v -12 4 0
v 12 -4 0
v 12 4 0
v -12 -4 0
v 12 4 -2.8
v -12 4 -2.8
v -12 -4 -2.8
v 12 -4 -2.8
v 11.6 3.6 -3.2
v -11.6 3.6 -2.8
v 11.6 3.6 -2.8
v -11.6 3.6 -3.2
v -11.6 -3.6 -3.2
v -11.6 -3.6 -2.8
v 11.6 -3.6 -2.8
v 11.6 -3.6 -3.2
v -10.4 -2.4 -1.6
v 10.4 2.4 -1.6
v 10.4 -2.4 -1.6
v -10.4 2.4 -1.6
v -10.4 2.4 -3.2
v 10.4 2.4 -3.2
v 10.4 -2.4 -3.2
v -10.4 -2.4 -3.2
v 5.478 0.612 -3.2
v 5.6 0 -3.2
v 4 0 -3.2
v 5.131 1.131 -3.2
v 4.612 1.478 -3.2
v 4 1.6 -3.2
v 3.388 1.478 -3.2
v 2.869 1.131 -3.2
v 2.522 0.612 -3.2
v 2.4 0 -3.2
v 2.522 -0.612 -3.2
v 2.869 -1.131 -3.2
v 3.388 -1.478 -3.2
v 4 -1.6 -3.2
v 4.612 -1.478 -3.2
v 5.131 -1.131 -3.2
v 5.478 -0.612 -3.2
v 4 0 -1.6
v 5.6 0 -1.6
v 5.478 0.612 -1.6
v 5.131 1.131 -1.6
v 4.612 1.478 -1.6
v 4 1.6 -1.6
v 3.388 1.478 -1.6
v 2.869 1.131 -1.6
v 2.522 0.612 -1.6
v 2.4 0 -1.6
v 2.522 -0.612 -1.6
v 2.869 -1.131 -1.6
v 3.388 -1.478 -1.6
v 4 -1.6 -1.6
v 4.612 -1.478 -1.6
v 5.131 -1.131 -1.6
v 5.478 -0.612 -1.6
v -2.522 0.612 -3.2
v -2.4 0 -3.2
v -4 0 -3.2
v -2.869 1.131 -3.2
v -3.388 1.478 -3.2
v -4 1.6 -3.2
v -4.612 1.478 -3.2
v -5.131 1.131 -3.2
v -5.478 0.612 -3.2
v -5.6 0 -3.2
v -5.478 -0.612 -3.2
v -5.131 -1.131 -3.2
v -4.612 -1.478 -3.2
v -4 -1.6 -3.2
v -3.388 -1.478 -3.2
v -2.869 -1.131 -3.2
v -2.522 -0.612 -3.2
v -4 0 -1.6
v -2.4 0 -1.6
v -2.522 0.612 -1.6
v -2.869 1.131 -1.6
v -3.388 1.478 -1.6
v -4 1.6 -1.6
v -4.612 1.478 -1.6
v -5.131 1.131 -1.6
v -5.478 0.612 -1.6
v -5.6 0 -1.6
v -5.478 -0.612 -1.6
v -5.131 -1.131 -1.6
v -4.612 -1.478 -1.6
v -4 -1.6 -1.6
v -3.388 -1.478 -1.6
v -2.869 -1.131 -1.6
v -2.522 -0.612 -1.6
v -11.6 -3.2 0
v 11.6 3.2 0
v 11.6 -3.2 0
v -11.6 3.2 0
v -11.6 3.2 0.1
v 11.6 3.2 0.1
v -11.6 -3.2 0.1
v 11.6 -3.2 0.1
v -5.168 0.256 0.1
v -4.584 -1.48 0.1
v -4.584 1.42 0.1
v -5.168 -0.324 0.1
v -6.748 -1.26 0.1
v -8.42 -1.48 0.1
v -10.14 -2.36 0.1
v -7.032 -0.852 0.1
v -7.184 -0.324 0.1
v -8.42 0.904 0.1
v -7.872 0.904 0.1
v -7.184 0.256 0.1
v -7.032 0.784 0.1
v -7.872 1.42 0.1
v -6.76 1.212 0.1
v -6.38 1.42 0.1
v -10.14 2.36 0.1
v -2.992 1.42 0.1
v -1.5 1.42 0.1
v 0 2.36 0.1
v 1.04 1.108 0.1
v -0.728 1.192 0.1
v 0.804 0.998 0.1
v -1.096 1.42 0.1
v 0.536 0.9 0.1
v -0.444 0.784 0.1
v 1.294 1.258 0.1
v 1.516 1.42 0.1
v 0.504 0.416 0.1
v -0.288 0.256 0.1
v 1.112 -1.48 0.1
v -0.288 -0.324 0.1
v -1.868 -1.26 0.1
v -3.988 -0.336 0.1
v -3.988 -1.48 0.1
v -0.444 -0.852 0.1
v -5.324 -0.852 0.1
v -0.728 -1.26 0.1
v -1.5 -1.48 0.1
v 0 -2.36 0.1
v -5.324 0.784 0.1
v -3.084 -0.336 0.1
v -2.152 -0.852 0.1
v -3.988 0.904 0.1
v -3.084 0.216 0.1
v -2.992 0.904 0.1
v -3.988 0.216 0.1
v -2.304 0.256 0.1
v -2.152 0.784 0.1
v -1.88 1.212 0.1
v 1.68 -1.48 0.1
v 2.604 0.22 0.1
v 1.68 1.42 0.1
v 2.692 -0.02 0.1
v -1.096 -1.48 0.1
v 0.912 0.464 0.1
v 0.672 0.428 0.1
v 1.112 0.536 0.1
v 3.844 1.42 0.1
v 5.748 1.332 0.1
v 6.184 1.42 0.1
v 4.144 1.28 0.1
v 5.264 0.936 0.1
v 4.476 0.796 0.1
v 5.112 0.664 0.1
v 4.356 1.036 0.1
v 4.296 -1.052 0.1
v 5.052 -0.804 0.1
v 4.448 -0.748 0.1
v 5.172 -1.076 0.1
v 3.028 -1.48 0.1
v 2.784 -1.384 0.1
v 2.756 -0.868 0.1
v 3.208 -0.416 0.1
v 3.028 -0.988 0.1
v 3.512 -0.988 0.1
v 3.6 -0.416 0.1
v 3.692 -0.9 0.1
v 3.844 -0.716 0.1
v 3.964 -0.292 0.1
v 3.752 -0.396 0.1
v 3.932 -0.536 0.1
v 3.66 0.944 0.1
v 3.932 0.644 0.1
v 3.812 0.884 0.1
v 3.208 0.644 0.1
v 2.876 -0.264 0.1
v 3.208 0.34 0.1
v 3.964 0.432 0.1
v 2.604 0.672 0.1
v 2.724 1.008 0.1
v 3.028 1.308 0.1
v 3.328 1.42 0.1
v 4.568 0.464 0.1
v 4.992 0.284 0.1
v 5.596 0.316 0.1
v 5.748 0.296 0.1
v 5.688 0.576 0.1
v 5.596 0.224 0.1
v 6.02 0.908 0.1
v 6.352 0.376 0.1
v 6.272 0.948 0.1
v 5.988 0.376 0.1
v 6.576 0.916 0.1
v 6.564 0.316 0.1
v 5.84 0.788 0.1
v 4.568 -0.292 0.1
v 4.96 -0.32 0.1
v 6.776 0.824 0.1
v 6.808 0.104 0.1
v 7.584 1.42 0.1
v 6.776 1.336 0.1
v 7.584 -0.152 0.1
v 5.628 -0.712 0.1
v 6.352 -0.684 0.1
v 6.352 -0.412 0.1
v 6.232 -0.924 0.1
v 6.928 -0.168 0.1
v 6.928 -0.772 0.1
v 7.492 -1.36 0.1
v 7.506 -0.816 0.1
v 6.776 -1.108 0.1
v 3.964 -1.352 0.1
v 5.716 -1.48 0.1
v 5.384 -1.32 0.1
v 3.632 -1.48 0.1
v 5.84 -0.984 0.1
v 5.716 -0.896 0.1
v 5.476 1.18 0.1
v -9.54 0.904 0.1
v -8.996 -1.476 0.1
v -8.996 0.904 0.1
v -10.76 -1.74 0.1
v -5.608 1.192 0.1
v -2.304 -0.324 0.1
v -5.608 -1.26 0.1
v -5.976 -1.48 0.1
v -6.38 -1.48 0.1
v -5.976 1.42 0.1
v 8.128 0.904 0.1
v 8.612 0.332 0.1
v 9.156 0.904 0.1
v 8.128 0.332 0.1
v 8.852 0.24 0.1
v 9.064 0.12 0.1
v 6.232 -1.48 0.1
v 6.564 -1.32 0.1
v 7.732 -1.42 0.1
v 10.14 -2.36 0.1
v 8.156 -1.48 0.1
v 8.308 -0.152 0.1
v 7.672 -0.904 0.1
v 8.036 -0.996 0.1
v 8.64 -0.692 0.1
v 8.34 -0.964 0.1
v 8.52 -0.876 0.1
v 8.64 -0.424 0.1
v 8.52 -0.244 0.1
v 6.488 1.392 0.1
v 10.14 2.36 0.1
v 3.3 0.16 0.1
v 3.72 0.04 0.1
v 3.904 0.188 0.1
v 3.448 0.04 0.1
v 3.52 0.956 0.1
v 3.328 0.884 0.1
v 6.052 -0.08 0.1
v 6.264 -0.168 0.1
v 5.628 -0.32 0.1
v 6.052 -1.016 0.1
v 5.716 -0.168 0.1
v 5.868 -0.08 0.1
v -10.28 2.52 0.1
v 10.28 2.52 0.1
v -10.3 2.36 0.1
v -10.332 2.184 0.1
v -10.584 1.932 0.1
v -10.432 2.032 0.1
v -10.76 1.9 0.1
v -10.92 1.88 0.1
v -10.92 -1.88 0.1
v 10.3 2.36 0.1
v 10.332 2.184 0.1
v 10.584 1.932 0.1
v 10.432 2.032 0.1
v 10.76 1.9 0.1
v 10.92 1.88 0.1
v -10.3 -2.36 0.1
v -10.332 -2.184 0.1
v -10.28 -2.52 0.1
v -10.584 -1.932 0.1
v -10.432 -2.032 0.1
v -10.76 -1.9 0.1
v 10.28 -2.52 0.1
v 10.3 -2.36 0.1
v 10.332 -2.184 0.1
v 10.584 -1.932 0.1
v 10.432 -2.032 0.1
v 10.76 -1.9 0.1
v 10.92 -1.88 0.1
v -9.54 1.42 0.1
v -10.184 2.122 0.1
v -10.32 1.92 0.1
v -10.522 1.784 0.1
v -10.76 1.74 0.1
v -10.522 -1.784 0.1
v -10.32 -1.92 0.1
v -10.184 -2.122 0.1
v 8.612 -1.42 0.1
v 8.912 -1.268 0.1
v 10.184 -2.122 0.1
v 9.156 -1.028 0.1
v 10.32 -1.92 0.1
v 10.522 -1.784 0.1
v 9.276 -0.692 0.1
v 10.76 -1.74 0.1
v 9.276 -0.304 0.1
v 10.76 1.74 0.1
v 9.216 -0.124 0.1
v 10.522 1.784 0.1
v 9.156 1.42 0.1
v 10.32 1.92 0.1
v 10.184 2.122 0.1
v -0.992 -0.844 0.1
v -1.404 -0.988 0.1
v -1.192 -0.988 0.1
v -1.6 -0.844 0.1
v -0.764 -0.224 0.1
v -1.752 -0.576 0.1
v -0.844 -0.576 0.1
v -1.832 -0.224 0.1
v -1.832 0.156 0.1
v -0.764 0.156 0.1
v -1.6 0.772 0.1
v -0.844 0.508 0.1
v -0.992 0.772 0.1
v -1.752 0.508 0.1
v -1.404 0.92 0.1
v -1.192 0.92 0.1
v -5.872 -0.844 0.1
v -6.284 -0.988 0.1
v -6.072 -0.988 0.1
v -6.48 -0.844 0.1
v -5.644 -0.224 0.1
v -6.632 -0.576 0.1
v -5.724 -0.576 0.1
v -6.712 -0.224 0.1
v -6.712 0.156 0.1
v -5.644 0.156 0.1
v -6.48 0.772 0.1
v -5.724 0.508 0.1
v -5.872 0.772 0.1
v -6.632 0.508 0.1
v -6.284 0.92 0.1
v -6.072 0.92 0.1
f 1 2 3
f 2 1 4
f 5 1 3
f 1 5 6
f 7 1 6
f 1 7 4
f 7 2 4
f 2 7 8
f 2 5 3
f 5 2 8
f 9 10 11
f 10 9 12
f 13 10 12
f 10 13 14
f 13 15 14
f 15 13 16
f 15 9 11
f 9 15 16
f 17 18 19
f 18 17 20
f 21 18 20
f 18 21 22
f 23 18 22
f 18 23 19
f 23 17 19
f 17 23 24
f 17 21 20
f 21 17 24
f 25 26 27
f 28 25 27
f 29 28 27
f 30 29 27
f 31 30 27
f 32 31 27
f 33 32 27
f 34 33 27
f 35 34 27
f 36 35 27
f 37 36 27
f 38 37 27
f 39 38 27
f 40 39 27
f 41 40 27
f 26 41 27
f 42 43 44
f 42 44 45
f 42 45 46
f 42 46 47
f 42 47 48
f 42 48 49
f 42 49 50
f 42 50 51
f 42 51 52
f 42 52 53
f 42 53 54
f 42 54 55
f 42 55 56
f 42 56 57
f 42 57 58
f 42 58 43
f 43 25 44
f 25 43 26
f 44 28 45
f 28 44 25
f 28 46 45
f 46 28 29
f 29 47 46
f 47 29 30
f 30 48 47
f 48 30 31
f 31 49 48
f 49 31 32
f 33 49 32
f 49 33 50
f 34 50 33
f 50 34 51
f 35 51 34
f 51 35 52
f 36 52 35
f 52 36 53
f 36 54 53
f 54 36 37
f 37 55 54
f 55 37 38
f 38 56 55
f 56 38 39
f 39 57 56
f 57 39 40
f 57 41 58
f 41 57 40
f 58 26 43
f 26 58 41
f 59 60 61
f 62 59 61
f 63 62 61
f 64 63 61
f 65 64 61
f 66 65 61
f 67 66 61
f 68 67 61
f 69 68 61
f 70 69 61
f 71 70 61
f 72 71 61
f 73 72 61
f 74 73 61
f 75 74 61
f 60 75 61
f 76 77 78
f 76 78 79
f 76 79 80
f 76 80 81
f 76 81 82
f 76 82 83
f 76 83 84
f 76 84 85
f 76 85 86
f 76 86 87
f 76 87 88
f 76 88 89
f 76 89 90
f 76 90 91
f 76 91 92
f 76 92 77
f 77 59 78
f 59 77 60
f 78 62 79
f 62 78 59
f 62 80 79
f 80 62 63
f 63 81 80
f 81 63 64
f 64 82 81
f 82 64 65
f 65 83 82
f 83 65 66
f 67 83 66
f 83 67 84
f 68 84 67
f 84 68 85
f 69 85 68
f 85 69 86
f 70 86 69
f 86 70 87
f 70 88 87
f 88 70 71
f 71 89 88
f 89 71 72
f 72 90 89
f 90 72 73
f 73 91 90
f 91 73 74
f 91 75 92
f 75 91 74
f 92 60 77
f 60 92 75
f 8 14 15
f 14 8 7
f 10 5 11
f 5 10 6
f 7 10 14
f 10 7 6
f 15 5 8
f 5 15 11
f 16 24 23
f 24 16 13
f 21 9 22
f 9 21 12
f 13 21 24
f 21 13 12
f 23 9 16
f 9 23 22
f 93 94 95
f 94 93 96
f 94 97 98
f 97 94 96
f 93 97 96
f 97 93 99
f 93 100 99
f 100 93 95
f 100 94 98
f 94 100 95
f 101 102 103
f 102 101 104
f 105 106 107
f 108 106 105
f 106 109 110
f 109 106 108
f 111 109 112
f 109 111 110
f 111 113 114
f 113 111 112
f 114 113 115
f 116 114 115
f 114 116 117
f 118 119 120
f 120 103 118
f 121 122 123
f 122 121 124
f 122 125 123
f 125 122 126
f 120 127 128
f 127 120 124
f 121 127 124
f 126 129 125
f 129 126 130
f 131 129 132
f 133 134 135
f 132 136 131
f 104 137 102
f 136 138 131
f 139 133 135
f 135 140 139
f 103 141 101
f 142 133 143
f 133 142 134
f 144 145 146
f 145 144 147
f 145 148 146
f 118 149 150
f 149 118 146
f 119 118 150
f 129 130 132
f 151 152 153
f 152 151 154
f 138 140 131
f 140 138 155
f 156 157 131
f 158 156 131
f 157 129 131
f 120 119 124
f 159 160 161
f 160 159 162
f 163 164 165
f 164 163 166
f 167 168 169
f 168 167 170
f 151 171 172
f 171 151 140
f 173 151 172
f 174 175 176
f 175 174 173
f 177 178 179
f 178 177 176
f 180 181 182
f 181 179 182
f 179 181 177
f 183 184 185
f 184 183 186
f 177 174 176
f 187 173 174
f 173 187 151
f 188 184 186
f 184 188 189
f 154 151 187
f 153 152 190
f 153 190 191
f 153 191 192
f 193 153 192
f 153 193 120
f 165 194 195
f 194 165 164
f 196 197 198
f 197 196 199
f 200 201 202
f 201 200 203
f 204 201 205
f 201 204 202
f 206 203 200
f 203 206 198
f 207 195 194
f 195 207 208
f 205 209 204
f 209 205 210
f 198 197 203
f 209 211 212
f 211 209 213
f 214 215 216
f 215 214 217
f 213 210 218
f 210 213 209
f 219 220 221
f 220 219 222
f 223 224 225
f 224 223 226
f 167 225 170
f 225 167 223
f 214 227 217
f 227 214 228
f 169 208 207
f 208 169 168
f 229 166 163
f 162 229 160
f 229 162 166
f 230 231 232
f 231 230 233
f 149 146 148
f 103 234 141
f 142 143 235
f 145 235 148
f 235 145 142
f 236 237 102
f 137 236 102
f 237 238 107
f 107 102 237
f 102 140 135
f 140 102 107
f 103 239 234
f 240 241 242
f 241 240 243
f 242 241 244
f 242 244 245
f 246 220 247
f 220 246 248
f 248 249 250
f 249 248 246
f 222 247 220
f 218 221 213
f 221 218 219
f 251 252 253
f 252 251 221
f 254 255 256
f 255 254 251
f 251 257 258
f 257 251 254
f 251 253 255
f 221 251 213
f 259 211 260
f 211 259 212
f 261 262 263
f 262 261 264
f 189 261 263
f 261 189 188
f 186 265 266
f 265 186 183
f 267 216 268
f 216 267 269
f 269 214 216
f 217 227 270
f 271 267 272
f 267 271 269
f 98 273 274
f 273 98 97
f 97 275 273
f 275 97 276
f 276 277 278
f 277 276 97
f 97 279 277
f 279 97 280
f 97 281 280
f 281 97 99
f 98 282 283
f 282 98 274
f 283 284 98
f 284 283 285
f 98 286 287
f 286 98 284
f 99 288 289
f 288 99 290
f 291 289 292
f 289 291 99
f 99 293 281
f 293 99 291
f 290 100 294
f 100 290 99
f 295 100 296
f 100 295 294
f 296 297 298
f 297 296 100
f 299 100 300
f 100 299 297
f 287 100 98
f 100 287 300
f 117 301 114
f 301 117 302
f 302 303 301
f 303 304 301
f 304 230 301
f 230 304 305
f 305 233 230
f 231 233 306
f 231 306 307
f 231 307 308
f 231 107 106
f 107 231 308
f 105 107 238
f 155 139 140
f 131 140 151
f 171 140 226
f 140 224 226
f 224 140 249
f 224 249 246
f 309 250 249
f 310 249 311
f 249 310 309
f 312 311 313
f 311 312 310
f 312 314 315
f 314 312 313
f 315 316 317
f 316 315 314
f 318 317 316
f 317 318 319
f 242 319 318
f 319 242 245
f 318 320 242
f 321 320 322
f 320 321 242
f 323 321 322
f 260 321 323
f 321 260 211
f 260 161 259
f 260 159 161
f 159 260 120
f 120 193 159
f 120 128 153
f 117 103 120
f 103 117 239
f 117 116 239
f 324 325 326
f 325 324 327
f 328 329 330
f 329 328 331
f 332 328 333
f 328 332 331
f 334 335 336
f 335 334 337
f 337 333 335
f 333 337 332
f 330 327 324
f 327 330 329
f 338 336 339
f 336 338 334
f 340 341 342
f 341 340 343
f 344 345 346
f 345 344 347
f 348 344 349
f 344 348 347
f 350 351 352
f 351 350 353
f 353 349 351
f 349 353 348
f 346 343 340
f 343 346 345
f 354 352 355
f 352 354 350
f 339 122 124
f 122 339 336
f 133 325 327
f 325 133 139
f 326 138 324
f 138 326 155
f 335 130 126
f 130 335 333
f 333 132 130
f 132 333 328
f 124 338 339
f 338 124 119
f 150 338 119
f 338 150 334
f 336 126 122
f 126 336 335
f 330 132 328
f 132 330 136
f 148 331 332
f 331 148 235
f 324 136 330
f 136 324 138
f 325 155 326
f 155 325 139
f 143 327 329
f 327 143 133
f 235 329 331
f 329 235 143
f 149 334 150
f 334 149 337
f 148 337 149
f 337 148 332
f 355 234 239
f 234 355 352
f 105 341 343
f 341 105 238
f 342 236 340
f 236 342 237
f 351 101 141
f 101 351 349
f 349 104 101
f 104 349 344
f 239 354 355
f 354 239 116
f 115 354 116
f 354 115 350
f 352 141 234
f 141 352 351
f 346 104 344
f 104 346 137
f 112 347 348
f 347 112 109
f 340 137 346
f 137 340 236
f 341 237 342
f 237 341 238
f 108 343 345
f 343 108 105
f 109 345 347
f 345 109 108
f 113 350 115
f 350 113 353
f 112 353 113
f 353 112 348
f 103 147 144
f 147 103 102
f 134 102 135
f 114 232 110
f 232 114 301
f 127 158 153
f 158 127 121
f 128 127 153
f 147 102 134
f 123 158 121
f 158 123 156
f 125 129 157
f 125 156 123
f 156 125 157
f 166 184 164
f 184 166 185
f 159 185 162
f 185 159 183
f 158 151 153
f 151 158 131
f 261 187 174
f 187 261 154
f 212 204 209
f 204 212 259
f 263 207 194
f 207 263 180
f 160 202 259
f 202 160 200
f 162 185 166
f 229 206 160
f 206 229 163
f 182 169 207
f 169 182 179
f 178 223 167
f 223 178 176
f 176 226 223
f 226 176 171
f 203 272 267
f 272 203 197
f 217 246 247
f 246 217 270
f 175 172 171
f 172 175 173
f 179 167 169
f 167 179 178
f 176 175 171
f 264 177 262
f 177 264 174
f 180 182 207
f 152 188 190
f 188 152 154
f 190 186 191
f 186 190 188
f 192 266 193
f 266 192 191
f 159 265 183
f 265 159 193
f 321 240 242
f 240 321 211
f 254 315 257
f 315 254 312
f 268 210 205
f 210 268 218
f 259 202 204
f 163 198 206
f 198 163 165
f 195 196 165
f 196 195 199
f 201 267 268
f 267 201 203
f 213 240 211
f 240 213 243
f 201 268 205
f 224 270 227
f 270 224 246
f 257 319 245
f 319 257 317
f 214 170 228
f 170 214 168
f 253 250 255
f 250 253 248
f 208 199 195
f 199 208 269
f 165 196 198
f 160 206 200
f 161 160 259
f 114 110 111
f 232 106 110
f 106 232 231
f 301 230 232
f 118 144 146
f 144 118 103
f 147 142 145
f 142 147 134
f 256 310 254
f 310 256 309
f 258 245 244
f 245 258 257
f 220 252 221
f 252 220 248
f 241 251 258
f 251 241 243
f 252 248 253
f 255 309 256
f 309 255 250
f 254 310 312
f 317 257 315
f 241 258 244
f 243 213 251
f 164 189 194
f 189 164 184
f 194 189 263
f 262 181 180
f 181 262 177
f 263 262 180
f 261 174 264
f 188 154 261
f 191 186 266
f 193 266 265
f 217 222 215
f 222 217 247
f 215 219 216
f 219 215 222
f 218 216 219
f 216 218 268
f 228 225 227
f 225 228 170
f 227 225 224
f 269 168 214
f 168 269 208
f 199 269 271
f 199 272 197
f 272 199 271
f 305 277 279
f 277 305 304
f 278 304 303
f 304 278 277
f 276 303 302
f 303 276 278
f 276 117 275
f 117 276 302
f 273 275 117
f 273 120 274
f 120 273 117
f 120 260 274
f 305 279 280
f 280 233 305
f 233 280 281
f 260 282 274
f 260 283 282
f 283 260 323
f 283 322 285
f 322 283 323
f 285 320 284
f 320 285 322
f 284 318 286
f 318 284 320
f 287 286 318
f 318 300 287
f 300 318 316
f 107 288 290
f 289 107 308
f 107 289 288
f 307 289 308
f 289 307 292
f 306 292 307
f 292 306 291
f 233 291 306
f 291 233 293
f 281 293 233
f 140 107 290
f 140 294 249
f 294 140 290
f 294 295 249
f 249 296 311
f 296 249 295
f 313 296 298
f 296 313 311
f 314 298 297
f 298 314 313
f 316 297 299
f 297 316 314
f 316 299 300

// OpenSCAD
use <../lib.scad>
use <6296256l.scad>
use <63864.scad>
function ldraw_lib__63864d0h() = [
// 0 Tile  1 x  3 with White "TOFO 1965" on Black Background Sticker
// 0 Name: 63864d0h.dat
// 0 Author: Evert-Jan Boer [ejboer]
// 0 !LDRAW_ORG Shortcut UPDATE 2026-07
// 0 !LICENSE Licensed under CC BY 4.0 : see CAreadme.txt
// 
// 0 BFC CERTIFY CCW
  [0,"BFC","CERTIFY"],
  [0,"BFC","CCW"],
// 
// 0 !CATEGORY Sticker Shortcut
// 0 !KEYWORDS Bricklink 63864pb158, Fiat 500, set 10271, set 77942
// 
// 0 !HISTORY 2026-07-30 [OrionP] Official Update 2026-07
// 
// 1 16 0 0 0 1 0 0 0 1 0 0 0 1 63864.dat
  [1,16,0,0,0,1,0,0,0,1,0,0,0,1, ldraw_lib__63864()],
// 1 16 0 0 0 1 0 0 0 1 0 0 0 1 6296256l.dat
  [1,16,0,0,0,1,0,0,0,1,0,0,0,1, ldraw_lib__6296256l()],
];
module ldraw_lib__63864d0h(step=0, col=false, unit=2/5, alt=false, line=0.2, solid=!$preview)
    makepoly(ldraw_lib__63864d0h(), step=step, col=col, unit=unit, alt=alt, line=line, solid=solid);
ldraw_lib__63864d0h(line=0.2);
